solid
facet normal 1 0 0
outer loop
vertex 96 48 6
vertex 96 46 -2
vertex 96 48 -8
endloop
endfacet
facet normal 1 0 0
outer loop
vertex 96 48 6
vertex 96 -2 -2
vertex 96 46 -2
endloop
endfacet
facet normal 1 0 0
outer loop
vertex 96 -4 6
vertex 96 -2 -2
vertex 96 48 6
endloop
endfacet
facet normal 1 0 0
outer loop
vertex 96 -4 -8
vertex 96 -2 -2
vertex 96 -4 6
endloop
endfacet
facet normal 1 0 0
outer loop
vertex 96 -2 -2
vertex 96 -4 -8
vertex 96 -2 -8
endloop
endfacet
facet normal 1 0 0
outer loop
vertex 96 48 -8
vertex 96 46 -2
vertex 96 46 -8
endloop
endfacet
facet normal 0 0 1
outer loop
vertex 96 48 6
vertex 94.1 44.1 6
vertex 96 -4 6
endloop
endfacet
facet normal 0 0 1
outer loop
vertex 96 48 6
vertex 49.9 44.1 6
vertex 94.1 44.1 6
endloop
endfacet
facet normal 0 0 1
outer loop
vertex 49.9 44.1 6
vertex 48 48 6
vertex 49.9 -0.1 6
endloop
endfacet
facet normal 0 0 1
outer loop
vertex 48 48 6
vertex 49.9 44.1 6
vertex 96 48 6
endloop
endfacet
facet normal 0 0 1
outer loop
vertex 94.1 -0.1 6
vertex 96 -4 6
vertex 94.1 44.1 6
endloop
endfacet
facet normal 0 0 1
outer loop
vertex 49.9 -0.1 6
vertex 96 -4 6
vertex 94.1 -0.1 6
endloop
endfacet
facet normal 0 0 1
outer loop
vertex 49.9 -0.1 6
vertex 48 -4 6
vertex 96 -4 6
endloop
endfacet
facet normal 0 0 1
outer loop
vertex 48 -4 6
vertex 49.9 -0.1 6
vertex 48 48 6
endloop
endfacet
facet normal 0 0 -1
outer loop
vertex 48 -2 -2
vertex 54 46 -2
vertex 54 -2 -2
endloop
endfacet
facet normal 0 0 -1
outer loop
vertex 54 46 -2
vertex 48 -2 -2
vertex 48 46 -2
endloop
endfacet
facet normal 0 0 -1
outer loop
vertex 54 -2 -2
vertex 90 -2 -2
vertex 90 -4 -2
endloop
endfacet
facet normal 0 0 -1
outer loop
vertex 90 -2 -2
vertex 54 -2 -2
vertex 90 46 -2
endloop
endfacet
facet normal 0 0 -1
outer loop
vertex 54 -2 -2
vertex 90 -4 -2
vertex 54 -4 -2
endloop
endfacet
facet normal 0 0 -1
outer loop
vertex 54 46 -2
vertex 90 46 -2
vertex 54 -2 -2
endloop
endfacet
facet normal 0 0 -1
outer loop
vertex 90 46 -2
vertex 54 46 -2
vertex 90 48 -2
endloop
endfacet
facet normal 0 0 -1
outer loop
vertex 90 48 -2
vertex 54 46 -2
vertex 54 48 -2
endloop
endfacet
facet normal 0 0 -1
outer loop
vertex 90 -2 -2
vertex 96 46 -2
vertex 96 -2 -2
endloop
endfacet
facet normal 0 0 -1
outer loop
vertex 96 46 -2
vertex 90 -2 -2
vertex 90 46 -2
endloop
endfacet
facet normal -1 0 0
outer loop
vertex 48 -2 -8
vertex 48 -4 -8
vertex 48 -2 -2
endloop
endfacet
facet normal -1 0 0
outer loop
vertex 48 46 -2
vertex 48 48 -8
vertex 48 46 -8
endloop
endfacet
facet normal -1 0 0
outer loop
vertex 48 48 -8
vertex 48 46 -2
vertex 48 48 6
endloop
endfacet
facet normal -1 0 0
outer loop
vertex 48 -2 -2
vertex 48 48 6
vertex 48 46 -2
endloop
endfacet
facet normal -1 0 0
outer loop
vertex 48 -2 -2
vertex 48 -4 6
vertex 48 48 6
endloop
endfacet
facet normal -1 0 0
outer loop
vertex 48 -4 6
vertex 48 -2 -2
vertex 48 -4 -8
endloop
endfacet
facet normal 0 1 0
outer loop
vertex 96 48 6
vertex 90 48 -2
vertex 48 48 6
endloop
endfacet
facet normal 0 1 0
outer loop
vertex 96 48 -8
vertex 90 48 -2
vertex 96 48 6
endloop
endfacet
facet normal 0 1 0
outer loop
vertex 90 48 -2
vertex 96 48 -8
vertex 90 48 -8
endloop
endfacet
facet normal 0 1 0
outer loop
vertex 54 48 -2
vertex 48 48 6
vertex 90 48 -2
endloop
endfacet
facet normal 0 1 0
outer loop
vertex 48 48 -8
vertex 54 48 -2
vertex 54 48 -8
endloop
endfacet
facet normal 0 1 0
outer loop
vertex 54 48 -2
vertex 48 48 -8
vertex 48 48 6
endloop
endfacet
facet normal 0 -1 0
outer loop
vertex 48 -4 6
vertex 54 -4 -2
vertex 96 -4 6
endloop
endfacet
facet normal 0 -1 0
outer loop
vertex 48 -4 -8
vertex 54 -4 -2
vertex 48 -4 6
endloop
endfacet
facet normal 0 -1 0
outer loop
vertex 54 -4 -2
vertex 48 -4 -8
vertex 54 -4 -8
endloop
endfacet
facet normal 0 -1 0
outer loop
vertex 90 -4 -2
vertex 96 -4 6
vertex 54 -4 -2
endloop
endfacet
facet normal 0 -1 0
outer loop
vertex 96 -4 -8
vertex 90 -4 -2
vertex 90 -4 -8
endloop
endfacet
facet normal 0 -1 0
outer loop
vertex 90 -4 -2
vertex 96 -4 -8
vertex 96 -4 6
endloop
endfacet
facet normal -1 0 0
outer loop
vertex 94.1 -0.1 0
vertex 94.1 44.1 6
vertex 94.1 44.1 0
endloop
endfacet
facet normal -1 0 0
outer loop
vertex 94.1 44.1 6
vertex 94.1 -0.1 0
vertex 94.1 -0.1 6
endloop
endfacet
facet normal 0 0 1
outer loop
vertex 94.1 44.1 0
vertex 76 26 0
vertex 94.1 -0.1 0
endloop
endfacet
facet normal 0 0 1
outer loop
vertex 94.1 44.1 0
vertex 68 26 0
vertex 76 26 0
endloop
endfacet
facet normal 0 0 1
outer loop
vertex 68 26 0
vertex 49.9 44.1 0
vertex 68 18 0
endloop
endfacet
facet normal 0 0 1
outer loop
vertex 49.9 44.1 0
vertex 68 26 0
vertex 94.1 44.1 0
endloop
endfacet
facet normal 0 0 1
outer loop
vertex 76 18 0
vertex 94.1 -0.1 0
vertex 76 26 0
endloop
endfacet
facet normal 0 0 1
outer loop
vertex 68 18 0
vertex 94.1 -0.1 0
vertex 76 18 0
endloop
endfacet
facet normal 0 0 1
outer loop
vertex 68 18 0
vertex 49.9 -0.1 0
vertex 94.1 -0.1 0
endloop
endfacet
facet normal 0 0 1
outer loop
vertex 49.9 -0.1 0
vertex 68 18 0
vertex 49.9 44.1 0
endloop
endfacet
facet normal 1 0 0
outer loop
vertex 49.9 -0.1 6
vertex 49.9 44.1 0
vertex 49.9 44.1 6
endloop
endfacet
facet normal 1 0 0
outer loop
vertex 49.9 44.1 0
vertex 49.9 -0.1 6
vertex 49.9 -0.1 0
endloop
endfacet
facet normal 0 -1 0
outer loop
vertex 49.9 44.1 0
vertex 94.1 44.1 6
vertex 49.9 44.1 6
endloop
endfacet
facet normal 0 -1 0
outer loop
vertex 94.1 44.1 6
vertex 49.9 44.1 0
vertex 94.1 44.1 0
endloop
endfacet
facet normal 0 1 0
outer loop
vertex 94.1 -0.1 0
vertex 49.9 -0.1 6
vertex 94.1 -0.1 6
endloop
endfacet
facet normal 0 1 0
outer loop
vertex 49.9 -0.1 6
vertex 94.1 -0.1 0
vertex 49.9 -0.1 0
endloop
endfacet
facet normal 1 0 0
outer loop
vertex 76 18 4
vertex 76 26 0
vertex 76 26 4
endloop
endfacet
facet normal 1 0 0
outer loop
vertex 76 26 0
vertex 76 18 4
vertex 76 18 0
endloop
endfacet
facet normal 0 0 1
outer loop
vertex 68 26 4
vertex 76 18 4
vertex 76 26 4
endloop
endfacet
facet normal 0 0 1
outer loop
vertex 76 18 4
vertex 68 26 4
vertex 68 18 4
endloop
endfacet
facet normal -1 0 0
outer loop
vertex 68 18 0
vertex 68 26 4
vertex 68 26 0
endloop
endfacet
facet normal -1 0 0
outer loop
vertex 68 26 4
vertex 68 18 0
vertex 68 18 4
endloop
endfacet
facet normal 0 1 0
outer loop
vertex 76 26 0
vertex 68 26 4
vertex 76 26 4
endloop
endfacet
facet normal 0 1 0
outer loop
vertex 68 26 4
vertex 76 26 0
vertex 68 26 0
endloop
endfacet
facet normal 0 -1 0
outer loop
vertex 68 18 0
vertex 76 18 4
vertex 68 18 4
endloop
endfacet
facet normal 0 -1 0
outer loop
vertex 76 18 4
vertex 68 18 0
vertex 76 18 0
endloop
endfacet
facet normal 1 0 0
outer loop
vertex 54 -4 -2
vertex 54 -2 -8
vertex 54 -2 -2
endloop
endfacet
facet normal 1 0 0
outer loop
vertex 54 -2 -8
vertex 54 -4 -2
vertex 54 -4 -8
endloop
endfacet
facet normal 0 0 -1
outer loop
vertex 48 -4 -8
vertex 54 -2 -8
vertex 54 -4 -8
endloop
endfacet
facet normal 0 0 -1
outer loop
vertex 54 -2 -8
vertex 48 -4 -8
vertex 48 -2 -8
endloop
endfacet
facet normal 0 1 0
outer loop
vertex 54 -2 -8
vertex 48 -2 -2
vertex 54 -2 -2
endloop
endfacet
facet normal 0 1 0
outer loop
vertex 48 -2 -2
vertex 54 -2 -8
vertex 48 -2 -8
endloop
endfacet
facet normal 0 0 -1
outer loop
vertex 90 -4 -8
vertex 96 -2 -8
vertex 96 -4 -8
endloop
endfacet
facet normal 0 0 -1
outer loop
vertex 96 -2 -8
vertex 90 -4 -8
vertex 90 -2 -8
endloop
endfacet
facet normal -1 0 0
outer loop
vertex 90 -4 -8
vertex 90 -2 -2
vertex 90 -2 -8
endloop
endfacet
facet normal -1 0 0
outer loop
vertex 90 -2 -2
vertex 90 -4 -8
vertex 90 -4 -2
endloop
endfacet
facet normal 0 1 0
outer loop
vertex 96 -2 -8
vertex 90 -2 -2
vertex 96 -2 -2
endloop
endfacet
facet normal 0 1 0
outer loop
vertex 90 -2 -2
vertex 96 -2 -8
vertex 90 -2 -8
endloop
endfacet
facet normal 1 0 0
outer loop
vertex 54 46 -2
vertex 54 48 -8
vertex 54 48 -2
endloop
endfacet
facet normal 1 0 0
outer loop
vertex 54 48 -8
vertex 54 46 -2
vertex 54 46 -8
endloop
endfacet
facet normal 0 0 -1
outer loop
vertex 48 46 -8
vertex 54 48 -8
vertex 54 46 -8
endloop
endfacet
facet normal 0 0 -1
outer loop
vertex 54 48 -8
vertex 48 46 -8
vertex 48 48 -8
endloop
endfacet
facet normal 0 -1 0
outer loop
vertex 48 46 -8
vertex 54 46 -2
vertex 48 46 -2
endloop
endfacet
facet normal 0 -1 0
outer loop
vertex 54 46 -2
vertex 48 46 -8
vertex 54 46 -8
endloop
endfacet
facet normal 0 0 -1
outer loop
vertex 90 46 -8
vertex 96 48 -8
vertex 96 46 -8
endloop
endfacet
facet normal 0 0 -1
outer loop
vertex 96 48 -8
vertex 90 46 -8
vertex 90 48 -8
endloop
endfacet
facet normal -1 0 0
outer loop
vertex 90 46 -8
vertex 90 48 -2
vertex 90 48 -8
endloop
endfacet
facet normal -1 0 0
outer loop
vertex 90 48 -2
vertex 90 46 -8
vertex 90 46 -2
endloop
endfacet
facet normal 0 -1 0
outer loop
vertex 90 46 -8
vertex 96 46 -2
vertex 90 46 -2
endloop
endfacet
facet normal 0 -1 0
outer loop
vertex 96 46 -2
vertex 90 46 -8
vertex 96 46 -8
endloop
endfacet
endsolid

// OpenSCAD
psuBoardWidth=40;
psuBoardHeight=40;
wallThickness=2;

portSize=6;
acLive=[2.65, 22];
acNeut=[2.65, 34];

dcOut=[55, 6.5];

cableM = 3;

function pcbToCaseX(pcb) = pcb;
function pcbToCaseY(pcb) = psuBoardHeight - pcb;

containerHeight=22;

legHeight = 4 * wallThickness;

translate([psuBoardWidth + 10, 0, 0]) {
    difference() {
        translate([-wallThickness, -2 * wallThickness, -wallThickness]) {
            cube([4 * wallThickness + psuBoardWidth, 6 * wallThickness + psuBoardHeight, 4 * wallThickness]);
        }
        translate([-0.1, -0.1,0]) {
            cube([2 * wallThickness + psuBoardWidth + 0.2, 2 * wallThickness + psuBoardHeight + 0.2,3 * wallThickness + 0.01]);
        }
    }

    translate([-wallThickness + ((4 * wallThickness + psuBoardWidth) / 2) - 2 * wallThickness, -2 * wallThickness + ((6 * wallThickness + psuBoardHeight) / 2) - 2 * wallThickness, -wallThickness]) {
        cube([4 * wallThickness, 4 * wallThickness, 3 * wallThickness]);
    }

    translate([-wallThickness, -2 * wallThickness, -legHeight]) {
        cube([wallThickness * 3, wallThickness, legHeight]);
    }
    translate([psuBoardWidth - 0 * wallThickness, -2 * wallThickness, -legHeight]) {
        cube([wallThickness * 3, wallThickness, legHeight]);
    }

    translate([-wallThickness, psuBoardHeight + 3 * wallThickness, -legHeight]) {
        cube([wallThickness * 3, wallThickness, legHeight]);
    }
    translate([psuBoardWidth - 0 * wallThickness, psuBoardHeight + 3 * wallThickness, -legHeight]) {
        cube([wallThickness * 3, wallThickness, legHeight]);
    }
}
